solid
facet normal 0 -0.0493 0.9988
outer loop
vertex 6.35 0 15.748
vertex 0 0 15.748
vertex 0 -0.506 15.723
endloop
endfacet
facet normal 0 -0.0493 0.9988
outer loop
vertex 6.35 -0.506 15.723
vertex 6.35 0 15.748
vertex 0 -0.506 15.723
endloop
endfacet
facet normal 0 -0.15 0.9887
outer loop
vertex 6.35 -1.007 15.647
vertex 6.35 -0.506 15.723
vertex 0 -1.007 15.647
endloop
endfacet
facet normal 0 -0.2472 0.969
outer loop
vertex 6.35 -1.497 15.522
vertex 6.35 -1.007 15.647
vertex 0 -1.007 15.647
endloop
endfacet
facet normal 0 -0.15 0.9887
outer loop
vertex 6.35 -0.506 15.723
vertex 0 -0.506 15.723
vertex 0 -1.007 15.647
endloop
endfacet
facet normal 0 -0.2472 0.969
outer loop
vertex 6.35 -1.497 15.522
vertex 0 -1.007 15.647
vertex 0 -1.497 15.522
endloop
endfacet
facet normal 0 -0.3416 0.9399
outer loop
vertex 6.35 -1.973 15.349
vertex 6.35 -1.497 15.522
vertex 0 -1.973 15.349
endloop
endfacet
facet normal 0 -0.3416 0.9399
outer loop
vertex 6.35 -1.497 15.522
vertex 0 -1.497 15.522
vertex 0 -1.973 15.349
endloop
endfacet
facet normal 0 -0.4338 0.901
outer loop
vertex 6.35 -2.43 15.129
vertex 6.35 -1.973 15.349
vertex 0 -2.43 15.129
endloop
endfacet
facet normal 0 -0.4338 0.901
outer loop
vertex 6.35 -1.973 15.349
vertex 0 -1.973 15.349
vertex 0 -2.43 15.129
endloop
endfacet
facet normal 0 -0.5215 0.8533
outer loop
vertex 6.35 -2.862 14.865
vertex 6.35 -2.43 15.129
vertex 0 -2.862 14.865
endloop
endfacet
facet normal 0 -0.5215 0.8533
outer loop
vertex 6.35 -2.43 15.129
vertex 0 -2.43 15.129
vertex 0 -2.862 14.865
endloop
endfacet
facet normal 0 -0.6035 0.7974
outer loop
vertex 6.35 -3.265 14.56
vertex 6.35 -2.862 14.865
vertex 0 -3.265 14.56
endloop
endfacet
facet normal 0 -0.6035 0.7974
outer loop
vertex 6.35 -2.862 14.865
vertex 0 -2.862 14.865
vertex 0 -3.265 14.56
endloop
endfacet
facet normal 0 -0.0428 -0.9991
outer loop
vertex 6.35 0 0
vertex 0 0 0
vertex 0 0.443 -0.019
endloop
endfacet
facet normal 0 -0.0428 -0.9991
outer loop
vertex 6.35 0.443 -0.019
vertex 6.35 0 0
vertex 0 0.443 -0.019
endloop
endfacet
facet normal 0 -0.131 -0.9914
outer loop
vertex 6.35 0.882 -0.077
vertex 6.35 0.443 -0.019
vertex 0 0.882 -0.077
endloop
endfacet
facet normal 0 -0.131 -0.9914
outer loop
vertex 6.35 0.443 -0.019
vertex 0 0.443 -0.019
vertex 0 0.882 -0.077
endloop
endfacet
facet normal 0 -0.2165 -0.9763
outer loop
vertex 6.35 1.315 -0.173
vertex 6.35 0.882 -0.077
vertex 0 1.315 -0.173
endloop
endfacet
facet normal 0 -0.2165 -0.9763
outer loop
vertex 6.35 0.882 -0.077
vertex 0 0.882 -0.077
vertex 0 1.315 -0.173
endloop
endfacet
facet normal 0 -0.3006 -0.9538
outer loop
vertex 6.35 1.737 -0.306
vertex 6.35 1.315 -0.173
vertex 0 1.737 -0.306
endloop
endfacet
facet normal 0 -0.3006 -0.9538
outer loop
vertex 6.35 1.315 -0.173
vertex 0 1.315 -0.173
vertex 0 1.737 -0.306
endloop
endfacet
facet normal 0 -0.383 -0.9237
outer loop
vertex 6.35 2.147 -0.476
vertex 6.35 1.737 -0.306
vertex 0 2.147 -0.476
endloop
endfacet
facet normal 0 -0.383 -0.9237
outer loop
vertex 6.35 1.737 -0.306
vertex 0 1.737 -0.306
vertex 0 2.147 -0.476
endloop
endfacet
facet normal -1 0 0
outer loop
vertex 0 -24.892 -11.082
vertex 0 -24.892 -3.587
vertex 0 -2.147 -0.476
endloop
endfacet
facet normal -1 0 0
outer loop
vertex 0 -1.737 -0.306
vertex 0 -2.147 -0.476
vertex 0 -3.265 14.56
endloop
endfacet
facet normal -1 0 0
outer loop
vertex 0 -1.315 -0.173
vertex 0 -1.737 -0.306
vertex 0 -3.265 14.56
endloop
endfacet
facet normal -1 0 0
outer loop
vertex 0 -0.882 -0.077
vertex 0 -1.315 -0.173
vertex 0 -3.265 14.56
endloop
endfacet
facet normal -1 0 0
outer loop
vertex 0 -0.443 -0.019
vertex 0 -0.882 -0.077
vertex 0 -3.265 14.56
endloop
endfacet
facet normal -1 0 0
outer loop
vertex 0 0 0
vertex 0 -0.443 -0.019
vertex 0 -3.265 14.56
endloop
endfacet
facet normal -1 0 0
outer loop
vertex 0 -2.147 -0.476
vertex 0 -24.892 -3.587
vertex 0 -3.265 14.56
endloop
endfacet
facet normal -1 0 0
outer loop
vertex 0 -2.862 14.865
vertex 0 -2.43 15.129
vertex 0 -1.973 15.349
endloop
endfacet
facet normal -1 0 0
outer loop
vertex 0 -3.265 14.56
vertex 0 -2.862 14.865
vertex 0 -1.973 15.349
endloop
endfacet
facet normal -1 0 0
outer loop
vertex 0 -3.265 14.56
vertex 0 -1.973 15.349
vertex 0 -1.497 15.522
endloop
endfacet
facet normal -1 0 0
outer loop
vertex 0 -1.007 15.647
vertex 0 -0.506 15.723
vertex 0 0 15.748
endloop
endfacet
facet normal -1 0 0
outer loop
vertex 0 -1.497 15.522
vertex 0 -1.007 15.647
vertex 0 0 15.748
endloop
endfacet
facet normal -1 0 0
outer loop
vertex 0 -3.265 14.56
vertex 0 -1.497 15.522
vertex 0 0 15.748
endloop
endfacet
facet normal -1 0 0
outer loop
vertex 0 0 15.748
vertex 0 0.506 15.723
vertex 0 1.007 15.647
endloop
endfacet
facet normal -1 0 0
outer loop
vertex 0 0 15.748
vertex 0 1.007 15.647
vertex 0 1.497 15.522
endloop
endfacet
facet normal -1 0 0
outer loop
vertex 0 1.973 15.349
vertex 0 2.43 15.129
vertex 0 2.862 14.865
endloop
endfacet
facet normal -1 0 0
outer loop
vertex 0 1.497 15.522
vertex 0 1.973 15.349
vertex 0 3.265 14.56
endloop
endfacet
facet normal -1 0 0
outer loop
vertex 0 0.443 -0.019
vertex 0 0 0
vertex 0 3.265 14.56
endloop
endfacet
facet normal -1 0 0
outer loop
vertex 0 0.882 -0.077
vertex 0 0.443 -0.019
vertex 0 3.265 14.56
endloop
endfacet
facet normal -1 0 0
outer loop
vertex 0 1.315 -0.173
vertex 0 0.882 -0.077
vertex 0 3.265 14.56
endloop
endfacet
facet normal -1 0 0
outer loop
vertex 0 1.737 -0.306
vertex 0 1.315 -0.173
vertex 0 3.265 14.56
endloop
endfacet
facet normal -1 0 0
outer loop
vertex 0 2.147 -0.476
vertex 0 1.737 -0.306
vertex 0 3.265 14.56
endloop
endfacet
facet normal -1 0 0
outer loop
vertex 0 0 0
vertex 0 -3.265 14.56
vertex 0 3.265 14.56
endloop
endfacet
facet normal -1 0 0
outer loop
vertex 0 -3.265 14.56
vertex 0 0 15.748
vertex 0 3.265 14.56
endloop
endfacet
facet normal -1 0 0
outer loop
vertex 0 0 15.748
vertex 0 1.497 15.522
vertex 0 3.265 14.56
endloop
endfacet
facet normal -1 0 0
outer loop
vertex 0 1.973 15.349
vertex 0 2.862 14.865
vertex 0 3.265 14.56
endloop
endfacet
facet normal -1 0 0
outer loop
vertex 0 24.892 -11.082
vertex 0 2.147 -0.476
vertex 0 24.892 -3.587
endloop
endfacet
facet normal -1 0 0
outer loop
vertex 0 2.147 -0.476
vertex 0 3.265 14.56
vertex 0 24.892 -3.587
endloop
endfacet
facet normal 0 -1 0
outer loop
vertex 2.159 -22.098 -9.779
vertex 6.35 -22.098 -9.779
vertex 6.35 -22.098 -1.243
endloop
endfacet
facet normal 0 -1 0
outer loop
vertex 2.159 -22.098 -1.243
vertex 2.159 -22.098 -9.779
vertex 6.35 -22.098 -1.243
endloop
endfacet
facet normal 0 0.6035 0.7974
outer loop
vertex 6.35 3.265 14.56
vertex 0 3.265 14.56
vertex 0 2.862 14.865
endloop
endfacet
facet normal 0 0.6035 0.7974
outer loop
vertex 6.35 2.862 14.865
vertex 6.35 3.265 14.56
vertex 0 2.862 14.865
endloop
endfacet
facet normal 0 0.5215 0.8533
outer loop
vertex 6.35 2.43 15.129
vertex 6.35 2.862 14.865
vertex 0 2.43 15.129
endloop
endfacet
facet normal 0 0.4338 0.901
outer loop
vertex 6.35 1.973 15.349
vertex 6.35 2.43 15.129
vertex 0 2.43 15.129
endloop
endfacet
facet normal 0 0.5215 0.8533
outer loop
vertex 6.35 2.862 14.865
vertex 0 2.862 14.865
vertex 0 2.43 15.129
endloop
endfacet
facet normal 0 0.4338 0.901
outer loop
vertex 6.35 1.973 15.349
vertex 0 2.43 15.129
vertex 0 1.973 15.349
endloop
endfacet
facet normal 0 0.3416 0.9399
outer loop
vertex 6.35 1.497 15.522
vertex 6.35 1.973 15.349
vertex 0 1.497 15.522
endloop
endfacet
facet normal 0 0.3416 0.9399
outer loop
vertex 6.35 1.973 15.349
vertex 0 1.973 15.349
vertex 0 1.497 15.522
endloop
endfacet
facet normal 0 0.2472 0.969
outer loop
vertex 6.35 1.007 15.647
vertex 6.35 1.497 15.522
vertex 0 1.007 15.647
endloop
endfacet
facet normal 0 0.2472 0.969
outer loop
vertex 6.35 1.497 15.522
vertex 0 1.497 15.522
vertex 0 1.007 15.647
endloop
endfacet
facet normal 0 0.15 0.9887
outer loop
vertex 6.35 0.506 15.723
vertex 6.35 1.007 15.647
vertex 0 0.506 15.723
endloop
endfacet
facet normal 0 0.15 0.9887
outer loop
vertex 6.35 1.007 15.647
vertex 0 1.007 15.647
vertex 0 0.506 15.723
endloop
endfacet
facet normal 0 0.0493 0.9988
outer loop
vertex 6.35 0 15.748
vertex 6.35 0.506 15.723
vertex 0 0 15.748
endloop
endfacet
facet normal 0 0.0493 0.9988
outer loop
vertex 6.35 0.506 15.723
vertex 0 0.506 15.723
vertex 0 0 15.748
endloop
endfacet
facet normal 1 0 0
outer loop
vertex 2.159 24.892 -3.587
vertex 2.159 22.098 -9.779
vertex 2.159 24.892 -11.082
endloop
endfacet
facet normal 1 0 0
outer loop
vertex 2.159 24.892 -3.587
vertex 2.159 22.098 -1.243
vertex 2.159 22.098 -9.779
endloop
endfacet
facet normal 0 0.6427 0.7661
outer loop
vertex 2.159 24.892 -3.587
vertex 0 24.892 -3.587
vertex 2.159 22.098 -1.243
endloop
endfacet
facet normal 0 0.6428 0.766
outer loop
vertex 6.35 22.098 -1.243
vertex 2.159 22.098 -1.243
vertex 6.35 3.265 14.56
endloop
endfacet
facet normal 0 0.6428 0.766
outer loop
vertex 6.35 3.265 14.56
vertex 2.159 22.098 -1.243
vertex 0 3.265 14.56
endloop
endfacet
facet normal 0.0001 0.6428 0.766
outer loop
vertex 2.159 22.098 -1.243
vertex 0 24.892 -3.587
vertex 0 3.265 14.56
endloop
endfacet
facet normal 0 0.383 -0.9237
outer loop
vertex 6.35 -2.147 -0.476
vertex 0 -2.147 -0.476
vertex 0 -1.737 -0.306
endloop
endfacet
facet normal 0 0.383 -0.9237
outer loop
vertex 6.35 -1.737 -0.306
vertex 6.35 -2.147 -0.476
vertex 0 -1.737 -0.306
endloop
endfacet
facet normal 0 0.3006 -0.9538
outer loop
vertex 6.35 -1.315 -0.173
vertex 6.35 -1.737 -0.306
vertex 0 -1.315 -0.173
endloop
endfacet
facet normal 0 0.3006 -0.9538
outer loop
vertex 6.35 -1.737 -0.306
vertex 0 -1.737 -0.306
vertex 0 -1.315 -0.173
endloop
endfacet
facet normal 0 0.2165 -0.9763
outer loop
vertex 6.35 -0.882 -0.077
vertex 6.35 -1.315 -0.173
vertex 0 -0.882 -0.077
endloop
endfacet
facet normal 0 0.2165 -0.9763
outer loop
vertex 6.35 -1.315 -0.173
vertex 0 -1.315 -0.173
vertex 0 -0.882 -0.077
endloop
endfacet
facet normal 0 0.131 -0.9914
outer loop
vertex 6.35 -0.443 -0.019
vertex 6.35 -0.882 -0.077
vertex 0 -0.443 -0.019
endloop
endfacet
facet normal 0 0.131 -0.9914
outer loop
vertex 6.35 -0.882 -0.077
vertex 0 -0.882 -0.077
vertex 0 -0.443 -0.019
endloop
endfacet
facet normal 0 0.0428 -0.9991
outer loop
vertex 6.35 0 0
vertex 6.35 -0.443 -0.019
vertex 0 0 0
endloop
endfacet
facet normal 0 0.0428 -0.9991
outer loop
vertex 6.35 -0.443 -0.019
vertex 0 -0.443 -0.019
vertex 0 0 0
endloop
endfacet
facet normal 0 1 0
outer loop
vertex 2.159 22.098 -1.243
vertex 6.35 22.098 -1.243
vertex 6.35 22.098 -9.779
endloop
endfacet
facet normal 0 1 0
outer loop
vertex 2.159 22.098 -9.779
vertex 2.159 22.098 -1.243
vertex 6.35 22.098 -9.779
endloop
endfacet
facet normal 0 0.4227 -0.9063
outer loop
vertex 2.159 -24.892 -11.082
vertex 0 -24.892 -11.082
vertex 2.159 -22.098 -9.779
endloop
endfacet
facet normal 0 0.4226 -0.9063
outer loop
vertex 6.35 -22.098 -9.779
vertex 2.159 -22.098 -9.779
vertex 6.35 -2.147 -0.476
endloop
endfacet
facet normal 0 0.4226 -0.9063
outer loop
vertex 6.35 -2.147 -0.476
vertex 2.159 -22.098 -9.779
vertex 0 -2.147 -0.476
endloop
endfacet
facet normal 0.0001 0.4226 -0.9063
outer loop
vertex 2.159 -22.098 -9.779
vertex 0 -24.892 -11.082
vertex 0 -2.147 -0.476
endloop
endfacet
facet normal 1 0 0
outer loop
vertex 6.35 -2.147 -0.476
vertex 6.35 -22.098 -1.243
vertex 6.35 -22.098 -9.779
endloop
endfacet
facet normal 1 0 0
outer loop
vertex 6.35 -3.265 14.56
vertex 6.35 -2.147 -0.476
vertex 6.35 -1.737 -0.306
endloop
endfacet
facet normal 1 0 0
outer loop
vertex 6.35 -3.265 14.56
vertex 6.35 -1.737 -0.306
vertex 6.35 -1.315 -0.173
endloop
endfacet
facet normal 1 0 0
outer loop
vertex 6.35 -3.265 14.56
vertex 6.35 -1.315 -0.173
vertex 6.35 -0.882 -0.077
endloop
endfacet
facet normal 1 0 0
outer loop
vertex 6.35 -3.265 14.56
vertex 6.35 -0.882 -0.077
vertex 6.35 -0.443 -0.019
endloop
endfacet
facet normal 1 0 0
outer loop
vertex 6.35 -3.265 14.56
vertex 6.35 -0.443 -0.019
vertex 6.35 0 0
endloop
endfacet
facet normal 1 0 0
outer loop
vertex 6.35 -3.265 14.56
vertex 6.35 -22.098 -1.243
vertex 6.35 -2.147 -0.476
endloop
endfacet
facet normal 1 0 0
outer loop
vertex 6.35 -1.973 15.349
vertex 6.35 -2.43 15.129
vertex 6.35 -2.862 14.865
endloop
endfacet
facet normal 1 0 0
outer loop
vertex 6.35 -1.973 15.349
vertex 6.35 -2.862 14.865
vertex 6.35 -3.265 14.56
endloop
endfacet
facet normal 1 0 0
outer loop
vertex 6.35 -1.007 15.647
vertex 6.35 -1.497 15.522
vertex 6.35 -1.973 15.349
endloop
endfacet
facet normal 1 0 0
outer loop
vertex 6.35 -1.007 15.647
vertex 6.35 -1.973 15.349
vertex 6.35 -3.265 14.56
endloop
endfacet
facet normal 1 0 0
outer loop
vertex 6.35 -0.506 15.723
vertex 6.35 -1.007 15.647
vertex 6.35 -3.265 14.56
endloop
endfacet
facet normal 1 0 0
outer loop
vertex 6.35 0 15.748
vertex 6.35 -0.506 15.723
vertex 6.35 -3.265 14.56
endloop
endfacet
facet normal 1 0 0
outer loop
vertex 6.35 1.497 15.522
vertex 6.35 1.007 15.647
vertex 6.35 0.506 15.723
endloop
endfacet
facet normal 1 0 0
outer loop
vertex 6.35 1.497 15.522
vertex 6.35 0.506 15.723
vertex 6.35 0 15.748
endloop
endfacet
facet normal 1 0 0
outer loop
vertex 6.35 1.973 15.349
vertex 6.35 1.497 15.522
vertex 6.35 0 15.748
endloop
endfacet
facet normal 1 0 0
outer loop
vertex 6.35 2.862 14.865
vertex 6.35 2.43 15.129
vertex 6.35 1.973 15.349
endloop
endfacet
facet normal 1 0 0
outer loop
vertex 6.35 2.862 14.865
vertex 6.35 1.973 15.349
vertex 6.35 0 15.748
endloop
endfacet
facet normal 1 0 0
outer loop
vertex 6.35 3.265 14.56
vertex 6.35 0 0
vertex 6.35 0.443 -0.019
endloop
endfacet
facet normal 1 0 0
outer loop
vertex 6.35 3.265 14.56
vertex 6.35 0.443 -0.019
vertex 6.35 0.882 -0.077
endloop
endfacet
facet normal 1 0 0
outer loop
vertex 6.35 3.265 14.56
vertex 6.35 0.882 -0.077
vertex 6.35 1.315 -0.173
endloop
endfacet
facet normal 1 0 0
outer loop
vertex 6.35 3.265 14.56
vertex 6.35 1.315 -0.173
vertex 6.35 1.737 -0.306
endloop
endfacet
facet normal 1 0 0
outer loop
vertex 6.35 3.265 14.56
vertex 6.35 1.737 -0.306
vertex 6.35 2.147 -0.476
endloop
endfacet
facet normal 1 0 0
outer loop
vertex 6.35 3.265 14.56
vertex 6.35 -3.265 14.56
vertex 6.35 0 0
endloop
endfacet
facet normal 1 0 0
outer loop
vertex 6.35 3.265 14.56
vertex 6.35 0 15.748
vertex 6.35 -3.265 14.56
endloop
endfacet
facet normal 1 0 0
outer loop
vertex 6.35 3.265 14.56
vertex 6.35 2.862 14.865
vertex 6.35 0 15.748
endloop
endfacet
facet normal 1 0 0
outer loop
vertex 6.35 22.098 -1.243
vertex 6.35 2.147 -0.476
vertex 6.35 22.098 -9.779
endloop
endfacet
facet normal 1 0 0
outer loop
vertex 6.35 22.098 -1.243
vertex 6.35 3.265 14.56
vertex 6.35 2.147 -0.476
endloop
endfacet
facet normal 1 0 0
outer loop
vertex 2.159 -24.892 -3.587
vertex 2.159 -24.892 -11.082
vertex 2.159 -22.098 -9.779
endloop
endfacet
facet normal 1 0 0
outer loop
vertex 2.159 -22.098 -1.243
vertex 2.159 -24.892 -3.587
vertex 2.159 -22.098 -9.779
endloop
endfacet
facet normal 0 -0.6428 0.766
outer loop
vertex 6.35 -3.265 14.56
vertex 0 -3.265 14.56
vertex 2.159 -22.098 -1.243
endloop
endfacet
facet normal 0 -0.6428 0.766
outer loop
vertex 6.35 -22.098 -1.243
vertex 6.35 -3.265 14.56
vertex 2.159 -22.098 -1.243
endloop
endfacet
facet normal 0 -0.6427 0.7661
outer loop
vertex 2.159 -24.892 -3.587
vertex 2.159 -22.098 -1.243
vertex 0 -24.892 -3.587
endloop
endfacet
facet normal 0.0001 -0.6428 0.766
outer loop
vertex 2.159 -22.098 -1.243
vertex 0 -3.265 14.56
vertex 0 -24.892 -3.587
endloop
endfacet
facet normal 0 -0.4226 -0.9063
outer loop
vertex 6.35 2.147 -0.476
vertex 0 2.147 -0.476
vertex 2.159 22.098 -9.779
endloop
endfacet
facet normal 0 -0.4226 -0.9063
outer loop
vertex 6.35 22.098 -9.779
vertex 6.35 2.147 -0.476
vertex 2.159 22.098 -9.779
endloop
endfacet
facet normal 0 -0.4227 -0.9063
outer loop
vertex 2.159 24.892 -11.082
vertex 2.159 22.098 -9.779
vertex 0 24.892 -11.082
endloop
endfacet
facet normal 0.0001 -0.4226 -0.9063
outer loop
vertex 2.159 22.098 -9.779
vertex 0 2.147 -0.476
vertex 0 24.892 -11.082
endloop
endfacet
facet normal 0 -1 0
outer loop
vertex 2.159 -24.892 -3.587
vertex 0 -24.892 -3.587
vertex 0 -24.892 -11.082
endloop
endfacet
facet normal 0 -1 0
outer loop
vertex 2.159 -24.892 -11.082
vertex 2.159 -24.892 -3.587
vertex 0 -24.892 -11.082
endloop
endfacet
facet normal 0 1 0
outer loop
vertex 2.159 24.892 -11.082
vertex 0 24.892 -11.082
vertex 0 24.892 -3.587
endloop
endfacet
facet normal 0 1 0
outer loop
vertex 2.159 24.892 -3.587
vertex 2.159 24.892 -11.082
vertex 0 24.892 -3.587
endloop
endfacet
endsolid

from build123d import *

# Parameters (mm, degrees)
F1_DEPTH = 6.35
F3_DEPTH = 4.191


with BuildPart() as f1:
    # F0 (on Right) → F1 (new body)
    with BuildSketch(Plane.YZ):
        with BuildLine():
            Line((24.892, -3.5873989895), (3.2653610572, 14.559505771))
            ThreePointArc((3.2653610572, 14.559505771), (1.7374623281, 15.4416385136), (0, 15.748))
            ThreePointArc((0, 15.748), (-1.7374623281, 15.4416385136), (-3.2653610572, 14.559505771))
            Line((-3.2653610572, 14.559505771), (-24.892, -3.5873989895))
            Line((-24.892, -3.5873989895), (-24.892, -11.0821703985))
            Line((-24.892, -11.0821703985), (-2.1469007696, -0.4759564419))
            ThreePointArc((-2.1469007696, -0.4759564419), (-1.0995132388, -0.1204162838), (0, 0))
            ThreePointArc((0, 0), (1.0995132388, -0.1204162838), (2.1469007696, -0.4759564419))
            Line((2.1469007696, -0.4759564419), (24.892, -11.0821703985))
            Line((24.892, -11.0821703985), (24.892, -3.5873989895))
        make_face()
    extrude(amount=F1_DEPTH)

    # F2 (on face) → F3 (cut)
    with BuildSketch(Plane.YZ.offset(6.35)):
        Polygon((22.098, -9.7793068016), (24.892, -11.0821703985), (24.892, -3.5873989895), (22.098, -1.2429546199), align=None)
        Polygon((-22.098, -9.7793068016), (-22.098, -1.2429546199), (-24.892, -3.5873989895), (-24.892, -11.0821703985), align=None)
    extrude(amount=-F3_DEPTH, mode=Mode.SUBTRACT)


solid = f1.part
